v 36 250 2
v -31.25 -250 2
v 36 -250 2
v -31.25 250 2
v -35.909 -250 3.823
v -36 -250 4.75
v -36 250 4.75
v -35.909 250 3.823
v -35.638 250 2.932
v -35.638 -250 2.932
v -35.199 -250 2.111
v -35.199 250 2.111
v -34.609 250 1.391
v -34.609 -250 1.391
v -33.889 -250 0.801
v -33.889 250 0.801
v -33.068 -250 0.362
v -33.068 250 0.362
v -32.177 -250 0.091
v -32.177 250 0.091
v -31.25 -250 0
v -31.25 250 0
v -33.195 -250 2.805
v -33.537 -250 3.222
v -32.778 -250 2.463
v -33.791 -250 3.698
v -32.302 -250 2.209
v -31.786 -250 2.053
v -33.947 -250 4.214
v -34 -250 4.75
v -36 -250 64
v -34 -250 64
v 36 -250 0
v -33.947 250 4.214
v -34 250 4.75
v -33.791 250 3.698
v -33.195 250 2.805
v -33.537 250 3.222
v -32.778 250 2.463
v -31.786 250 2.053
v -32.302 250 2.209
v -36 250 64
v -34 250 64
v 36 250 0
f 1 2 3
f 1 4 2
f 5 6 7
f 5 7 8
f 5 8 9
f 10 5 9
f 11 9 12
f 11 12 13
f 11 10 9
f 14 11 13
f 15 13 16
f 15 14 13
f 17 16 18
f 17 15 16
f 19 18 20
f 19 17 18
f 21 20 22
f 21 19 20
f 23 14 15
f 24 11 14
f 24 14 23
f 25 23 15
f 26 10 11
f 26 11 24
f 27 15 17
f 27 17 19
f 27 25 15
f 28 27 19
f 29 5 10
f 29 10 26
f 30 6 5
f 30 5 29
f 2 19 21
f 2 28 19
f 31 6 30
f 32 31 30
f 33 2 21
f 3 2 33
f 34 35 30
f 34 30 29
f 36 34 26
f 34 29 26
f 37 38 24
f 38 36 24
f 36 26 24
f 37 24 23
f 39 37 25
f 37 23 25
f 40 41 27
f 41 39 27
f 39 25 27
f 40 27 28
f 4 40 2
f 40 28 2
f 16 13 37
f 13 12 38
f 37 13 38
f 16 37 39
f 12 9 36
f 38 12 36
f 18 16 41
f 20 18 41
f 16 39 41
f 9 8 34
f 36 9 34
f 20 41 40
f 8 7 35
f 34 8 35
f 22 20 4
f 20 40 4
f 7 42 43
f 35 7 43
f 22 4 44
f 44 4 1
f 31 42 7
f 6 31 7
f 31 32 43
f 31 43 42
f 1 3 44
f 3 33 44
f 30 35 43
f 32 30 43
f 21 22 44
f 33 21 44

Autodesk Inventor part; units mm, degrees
ref_plane "YZ Plane" through (0, 0, 0) normal (1, 0, 0) x (0, 1, 0)
ref_plane "XZ Plane" through (0, 0, 0) normal (0, 1, 0) x (-1, 0, 0)
ref_plane "XY Plane" through (0, 0, 0) normal (0, 0, 1) x (1, 0, 0)
sketch "Sketch1" plane through (0, 0, 0) normal (0, 0, 1) x (1, 0, 0)
  line L0 (-36, -250) -> (36, -250)
  line L1 (36, -250) -> (36, 250)
  line L2 (36, 250) -> (-36, 250)
  line L3 (-36, 250) -> (-36, -250)
  line L4 (-36, -250) -> (36, 250) construction
  line L5 (36, -250) -> (-36, 250) construction
  point P0 (0, 0)
  dimension "d154" = 72
  dimension "d155" = 500
extrude "Plate5" add sketch "Sketch1" along normal blind 2
sketch "Sketch7" plane through (-34, -250, 0) normal (-1, 0, 0) x (0, -1, 0)
  line L0 (-500, 0) -> (0, 0)
  line L1 (0, 0) -> (0, 64)
  line L2 (0, 64) -> (-500, 64)
  line L3 (-500, 64) -> (-500, 0)
edge flange "Flange3" height 64 angle 90 thickness 2 bend radius 2.75 thickness toward (-1, 0, 0) relief round relief width 2 relief depth 1 edges at (-36, 0, 2) wall of the first edge with corners at (-34, 250, 0) (-34, -250, 0) (-34, -250, 64) (-34, 250, 64)
bend "Bend3"
corner "Corner3"
properties part number "PNS 753 FDS 1200 FLANGE 3" material "Stainless Steel"
